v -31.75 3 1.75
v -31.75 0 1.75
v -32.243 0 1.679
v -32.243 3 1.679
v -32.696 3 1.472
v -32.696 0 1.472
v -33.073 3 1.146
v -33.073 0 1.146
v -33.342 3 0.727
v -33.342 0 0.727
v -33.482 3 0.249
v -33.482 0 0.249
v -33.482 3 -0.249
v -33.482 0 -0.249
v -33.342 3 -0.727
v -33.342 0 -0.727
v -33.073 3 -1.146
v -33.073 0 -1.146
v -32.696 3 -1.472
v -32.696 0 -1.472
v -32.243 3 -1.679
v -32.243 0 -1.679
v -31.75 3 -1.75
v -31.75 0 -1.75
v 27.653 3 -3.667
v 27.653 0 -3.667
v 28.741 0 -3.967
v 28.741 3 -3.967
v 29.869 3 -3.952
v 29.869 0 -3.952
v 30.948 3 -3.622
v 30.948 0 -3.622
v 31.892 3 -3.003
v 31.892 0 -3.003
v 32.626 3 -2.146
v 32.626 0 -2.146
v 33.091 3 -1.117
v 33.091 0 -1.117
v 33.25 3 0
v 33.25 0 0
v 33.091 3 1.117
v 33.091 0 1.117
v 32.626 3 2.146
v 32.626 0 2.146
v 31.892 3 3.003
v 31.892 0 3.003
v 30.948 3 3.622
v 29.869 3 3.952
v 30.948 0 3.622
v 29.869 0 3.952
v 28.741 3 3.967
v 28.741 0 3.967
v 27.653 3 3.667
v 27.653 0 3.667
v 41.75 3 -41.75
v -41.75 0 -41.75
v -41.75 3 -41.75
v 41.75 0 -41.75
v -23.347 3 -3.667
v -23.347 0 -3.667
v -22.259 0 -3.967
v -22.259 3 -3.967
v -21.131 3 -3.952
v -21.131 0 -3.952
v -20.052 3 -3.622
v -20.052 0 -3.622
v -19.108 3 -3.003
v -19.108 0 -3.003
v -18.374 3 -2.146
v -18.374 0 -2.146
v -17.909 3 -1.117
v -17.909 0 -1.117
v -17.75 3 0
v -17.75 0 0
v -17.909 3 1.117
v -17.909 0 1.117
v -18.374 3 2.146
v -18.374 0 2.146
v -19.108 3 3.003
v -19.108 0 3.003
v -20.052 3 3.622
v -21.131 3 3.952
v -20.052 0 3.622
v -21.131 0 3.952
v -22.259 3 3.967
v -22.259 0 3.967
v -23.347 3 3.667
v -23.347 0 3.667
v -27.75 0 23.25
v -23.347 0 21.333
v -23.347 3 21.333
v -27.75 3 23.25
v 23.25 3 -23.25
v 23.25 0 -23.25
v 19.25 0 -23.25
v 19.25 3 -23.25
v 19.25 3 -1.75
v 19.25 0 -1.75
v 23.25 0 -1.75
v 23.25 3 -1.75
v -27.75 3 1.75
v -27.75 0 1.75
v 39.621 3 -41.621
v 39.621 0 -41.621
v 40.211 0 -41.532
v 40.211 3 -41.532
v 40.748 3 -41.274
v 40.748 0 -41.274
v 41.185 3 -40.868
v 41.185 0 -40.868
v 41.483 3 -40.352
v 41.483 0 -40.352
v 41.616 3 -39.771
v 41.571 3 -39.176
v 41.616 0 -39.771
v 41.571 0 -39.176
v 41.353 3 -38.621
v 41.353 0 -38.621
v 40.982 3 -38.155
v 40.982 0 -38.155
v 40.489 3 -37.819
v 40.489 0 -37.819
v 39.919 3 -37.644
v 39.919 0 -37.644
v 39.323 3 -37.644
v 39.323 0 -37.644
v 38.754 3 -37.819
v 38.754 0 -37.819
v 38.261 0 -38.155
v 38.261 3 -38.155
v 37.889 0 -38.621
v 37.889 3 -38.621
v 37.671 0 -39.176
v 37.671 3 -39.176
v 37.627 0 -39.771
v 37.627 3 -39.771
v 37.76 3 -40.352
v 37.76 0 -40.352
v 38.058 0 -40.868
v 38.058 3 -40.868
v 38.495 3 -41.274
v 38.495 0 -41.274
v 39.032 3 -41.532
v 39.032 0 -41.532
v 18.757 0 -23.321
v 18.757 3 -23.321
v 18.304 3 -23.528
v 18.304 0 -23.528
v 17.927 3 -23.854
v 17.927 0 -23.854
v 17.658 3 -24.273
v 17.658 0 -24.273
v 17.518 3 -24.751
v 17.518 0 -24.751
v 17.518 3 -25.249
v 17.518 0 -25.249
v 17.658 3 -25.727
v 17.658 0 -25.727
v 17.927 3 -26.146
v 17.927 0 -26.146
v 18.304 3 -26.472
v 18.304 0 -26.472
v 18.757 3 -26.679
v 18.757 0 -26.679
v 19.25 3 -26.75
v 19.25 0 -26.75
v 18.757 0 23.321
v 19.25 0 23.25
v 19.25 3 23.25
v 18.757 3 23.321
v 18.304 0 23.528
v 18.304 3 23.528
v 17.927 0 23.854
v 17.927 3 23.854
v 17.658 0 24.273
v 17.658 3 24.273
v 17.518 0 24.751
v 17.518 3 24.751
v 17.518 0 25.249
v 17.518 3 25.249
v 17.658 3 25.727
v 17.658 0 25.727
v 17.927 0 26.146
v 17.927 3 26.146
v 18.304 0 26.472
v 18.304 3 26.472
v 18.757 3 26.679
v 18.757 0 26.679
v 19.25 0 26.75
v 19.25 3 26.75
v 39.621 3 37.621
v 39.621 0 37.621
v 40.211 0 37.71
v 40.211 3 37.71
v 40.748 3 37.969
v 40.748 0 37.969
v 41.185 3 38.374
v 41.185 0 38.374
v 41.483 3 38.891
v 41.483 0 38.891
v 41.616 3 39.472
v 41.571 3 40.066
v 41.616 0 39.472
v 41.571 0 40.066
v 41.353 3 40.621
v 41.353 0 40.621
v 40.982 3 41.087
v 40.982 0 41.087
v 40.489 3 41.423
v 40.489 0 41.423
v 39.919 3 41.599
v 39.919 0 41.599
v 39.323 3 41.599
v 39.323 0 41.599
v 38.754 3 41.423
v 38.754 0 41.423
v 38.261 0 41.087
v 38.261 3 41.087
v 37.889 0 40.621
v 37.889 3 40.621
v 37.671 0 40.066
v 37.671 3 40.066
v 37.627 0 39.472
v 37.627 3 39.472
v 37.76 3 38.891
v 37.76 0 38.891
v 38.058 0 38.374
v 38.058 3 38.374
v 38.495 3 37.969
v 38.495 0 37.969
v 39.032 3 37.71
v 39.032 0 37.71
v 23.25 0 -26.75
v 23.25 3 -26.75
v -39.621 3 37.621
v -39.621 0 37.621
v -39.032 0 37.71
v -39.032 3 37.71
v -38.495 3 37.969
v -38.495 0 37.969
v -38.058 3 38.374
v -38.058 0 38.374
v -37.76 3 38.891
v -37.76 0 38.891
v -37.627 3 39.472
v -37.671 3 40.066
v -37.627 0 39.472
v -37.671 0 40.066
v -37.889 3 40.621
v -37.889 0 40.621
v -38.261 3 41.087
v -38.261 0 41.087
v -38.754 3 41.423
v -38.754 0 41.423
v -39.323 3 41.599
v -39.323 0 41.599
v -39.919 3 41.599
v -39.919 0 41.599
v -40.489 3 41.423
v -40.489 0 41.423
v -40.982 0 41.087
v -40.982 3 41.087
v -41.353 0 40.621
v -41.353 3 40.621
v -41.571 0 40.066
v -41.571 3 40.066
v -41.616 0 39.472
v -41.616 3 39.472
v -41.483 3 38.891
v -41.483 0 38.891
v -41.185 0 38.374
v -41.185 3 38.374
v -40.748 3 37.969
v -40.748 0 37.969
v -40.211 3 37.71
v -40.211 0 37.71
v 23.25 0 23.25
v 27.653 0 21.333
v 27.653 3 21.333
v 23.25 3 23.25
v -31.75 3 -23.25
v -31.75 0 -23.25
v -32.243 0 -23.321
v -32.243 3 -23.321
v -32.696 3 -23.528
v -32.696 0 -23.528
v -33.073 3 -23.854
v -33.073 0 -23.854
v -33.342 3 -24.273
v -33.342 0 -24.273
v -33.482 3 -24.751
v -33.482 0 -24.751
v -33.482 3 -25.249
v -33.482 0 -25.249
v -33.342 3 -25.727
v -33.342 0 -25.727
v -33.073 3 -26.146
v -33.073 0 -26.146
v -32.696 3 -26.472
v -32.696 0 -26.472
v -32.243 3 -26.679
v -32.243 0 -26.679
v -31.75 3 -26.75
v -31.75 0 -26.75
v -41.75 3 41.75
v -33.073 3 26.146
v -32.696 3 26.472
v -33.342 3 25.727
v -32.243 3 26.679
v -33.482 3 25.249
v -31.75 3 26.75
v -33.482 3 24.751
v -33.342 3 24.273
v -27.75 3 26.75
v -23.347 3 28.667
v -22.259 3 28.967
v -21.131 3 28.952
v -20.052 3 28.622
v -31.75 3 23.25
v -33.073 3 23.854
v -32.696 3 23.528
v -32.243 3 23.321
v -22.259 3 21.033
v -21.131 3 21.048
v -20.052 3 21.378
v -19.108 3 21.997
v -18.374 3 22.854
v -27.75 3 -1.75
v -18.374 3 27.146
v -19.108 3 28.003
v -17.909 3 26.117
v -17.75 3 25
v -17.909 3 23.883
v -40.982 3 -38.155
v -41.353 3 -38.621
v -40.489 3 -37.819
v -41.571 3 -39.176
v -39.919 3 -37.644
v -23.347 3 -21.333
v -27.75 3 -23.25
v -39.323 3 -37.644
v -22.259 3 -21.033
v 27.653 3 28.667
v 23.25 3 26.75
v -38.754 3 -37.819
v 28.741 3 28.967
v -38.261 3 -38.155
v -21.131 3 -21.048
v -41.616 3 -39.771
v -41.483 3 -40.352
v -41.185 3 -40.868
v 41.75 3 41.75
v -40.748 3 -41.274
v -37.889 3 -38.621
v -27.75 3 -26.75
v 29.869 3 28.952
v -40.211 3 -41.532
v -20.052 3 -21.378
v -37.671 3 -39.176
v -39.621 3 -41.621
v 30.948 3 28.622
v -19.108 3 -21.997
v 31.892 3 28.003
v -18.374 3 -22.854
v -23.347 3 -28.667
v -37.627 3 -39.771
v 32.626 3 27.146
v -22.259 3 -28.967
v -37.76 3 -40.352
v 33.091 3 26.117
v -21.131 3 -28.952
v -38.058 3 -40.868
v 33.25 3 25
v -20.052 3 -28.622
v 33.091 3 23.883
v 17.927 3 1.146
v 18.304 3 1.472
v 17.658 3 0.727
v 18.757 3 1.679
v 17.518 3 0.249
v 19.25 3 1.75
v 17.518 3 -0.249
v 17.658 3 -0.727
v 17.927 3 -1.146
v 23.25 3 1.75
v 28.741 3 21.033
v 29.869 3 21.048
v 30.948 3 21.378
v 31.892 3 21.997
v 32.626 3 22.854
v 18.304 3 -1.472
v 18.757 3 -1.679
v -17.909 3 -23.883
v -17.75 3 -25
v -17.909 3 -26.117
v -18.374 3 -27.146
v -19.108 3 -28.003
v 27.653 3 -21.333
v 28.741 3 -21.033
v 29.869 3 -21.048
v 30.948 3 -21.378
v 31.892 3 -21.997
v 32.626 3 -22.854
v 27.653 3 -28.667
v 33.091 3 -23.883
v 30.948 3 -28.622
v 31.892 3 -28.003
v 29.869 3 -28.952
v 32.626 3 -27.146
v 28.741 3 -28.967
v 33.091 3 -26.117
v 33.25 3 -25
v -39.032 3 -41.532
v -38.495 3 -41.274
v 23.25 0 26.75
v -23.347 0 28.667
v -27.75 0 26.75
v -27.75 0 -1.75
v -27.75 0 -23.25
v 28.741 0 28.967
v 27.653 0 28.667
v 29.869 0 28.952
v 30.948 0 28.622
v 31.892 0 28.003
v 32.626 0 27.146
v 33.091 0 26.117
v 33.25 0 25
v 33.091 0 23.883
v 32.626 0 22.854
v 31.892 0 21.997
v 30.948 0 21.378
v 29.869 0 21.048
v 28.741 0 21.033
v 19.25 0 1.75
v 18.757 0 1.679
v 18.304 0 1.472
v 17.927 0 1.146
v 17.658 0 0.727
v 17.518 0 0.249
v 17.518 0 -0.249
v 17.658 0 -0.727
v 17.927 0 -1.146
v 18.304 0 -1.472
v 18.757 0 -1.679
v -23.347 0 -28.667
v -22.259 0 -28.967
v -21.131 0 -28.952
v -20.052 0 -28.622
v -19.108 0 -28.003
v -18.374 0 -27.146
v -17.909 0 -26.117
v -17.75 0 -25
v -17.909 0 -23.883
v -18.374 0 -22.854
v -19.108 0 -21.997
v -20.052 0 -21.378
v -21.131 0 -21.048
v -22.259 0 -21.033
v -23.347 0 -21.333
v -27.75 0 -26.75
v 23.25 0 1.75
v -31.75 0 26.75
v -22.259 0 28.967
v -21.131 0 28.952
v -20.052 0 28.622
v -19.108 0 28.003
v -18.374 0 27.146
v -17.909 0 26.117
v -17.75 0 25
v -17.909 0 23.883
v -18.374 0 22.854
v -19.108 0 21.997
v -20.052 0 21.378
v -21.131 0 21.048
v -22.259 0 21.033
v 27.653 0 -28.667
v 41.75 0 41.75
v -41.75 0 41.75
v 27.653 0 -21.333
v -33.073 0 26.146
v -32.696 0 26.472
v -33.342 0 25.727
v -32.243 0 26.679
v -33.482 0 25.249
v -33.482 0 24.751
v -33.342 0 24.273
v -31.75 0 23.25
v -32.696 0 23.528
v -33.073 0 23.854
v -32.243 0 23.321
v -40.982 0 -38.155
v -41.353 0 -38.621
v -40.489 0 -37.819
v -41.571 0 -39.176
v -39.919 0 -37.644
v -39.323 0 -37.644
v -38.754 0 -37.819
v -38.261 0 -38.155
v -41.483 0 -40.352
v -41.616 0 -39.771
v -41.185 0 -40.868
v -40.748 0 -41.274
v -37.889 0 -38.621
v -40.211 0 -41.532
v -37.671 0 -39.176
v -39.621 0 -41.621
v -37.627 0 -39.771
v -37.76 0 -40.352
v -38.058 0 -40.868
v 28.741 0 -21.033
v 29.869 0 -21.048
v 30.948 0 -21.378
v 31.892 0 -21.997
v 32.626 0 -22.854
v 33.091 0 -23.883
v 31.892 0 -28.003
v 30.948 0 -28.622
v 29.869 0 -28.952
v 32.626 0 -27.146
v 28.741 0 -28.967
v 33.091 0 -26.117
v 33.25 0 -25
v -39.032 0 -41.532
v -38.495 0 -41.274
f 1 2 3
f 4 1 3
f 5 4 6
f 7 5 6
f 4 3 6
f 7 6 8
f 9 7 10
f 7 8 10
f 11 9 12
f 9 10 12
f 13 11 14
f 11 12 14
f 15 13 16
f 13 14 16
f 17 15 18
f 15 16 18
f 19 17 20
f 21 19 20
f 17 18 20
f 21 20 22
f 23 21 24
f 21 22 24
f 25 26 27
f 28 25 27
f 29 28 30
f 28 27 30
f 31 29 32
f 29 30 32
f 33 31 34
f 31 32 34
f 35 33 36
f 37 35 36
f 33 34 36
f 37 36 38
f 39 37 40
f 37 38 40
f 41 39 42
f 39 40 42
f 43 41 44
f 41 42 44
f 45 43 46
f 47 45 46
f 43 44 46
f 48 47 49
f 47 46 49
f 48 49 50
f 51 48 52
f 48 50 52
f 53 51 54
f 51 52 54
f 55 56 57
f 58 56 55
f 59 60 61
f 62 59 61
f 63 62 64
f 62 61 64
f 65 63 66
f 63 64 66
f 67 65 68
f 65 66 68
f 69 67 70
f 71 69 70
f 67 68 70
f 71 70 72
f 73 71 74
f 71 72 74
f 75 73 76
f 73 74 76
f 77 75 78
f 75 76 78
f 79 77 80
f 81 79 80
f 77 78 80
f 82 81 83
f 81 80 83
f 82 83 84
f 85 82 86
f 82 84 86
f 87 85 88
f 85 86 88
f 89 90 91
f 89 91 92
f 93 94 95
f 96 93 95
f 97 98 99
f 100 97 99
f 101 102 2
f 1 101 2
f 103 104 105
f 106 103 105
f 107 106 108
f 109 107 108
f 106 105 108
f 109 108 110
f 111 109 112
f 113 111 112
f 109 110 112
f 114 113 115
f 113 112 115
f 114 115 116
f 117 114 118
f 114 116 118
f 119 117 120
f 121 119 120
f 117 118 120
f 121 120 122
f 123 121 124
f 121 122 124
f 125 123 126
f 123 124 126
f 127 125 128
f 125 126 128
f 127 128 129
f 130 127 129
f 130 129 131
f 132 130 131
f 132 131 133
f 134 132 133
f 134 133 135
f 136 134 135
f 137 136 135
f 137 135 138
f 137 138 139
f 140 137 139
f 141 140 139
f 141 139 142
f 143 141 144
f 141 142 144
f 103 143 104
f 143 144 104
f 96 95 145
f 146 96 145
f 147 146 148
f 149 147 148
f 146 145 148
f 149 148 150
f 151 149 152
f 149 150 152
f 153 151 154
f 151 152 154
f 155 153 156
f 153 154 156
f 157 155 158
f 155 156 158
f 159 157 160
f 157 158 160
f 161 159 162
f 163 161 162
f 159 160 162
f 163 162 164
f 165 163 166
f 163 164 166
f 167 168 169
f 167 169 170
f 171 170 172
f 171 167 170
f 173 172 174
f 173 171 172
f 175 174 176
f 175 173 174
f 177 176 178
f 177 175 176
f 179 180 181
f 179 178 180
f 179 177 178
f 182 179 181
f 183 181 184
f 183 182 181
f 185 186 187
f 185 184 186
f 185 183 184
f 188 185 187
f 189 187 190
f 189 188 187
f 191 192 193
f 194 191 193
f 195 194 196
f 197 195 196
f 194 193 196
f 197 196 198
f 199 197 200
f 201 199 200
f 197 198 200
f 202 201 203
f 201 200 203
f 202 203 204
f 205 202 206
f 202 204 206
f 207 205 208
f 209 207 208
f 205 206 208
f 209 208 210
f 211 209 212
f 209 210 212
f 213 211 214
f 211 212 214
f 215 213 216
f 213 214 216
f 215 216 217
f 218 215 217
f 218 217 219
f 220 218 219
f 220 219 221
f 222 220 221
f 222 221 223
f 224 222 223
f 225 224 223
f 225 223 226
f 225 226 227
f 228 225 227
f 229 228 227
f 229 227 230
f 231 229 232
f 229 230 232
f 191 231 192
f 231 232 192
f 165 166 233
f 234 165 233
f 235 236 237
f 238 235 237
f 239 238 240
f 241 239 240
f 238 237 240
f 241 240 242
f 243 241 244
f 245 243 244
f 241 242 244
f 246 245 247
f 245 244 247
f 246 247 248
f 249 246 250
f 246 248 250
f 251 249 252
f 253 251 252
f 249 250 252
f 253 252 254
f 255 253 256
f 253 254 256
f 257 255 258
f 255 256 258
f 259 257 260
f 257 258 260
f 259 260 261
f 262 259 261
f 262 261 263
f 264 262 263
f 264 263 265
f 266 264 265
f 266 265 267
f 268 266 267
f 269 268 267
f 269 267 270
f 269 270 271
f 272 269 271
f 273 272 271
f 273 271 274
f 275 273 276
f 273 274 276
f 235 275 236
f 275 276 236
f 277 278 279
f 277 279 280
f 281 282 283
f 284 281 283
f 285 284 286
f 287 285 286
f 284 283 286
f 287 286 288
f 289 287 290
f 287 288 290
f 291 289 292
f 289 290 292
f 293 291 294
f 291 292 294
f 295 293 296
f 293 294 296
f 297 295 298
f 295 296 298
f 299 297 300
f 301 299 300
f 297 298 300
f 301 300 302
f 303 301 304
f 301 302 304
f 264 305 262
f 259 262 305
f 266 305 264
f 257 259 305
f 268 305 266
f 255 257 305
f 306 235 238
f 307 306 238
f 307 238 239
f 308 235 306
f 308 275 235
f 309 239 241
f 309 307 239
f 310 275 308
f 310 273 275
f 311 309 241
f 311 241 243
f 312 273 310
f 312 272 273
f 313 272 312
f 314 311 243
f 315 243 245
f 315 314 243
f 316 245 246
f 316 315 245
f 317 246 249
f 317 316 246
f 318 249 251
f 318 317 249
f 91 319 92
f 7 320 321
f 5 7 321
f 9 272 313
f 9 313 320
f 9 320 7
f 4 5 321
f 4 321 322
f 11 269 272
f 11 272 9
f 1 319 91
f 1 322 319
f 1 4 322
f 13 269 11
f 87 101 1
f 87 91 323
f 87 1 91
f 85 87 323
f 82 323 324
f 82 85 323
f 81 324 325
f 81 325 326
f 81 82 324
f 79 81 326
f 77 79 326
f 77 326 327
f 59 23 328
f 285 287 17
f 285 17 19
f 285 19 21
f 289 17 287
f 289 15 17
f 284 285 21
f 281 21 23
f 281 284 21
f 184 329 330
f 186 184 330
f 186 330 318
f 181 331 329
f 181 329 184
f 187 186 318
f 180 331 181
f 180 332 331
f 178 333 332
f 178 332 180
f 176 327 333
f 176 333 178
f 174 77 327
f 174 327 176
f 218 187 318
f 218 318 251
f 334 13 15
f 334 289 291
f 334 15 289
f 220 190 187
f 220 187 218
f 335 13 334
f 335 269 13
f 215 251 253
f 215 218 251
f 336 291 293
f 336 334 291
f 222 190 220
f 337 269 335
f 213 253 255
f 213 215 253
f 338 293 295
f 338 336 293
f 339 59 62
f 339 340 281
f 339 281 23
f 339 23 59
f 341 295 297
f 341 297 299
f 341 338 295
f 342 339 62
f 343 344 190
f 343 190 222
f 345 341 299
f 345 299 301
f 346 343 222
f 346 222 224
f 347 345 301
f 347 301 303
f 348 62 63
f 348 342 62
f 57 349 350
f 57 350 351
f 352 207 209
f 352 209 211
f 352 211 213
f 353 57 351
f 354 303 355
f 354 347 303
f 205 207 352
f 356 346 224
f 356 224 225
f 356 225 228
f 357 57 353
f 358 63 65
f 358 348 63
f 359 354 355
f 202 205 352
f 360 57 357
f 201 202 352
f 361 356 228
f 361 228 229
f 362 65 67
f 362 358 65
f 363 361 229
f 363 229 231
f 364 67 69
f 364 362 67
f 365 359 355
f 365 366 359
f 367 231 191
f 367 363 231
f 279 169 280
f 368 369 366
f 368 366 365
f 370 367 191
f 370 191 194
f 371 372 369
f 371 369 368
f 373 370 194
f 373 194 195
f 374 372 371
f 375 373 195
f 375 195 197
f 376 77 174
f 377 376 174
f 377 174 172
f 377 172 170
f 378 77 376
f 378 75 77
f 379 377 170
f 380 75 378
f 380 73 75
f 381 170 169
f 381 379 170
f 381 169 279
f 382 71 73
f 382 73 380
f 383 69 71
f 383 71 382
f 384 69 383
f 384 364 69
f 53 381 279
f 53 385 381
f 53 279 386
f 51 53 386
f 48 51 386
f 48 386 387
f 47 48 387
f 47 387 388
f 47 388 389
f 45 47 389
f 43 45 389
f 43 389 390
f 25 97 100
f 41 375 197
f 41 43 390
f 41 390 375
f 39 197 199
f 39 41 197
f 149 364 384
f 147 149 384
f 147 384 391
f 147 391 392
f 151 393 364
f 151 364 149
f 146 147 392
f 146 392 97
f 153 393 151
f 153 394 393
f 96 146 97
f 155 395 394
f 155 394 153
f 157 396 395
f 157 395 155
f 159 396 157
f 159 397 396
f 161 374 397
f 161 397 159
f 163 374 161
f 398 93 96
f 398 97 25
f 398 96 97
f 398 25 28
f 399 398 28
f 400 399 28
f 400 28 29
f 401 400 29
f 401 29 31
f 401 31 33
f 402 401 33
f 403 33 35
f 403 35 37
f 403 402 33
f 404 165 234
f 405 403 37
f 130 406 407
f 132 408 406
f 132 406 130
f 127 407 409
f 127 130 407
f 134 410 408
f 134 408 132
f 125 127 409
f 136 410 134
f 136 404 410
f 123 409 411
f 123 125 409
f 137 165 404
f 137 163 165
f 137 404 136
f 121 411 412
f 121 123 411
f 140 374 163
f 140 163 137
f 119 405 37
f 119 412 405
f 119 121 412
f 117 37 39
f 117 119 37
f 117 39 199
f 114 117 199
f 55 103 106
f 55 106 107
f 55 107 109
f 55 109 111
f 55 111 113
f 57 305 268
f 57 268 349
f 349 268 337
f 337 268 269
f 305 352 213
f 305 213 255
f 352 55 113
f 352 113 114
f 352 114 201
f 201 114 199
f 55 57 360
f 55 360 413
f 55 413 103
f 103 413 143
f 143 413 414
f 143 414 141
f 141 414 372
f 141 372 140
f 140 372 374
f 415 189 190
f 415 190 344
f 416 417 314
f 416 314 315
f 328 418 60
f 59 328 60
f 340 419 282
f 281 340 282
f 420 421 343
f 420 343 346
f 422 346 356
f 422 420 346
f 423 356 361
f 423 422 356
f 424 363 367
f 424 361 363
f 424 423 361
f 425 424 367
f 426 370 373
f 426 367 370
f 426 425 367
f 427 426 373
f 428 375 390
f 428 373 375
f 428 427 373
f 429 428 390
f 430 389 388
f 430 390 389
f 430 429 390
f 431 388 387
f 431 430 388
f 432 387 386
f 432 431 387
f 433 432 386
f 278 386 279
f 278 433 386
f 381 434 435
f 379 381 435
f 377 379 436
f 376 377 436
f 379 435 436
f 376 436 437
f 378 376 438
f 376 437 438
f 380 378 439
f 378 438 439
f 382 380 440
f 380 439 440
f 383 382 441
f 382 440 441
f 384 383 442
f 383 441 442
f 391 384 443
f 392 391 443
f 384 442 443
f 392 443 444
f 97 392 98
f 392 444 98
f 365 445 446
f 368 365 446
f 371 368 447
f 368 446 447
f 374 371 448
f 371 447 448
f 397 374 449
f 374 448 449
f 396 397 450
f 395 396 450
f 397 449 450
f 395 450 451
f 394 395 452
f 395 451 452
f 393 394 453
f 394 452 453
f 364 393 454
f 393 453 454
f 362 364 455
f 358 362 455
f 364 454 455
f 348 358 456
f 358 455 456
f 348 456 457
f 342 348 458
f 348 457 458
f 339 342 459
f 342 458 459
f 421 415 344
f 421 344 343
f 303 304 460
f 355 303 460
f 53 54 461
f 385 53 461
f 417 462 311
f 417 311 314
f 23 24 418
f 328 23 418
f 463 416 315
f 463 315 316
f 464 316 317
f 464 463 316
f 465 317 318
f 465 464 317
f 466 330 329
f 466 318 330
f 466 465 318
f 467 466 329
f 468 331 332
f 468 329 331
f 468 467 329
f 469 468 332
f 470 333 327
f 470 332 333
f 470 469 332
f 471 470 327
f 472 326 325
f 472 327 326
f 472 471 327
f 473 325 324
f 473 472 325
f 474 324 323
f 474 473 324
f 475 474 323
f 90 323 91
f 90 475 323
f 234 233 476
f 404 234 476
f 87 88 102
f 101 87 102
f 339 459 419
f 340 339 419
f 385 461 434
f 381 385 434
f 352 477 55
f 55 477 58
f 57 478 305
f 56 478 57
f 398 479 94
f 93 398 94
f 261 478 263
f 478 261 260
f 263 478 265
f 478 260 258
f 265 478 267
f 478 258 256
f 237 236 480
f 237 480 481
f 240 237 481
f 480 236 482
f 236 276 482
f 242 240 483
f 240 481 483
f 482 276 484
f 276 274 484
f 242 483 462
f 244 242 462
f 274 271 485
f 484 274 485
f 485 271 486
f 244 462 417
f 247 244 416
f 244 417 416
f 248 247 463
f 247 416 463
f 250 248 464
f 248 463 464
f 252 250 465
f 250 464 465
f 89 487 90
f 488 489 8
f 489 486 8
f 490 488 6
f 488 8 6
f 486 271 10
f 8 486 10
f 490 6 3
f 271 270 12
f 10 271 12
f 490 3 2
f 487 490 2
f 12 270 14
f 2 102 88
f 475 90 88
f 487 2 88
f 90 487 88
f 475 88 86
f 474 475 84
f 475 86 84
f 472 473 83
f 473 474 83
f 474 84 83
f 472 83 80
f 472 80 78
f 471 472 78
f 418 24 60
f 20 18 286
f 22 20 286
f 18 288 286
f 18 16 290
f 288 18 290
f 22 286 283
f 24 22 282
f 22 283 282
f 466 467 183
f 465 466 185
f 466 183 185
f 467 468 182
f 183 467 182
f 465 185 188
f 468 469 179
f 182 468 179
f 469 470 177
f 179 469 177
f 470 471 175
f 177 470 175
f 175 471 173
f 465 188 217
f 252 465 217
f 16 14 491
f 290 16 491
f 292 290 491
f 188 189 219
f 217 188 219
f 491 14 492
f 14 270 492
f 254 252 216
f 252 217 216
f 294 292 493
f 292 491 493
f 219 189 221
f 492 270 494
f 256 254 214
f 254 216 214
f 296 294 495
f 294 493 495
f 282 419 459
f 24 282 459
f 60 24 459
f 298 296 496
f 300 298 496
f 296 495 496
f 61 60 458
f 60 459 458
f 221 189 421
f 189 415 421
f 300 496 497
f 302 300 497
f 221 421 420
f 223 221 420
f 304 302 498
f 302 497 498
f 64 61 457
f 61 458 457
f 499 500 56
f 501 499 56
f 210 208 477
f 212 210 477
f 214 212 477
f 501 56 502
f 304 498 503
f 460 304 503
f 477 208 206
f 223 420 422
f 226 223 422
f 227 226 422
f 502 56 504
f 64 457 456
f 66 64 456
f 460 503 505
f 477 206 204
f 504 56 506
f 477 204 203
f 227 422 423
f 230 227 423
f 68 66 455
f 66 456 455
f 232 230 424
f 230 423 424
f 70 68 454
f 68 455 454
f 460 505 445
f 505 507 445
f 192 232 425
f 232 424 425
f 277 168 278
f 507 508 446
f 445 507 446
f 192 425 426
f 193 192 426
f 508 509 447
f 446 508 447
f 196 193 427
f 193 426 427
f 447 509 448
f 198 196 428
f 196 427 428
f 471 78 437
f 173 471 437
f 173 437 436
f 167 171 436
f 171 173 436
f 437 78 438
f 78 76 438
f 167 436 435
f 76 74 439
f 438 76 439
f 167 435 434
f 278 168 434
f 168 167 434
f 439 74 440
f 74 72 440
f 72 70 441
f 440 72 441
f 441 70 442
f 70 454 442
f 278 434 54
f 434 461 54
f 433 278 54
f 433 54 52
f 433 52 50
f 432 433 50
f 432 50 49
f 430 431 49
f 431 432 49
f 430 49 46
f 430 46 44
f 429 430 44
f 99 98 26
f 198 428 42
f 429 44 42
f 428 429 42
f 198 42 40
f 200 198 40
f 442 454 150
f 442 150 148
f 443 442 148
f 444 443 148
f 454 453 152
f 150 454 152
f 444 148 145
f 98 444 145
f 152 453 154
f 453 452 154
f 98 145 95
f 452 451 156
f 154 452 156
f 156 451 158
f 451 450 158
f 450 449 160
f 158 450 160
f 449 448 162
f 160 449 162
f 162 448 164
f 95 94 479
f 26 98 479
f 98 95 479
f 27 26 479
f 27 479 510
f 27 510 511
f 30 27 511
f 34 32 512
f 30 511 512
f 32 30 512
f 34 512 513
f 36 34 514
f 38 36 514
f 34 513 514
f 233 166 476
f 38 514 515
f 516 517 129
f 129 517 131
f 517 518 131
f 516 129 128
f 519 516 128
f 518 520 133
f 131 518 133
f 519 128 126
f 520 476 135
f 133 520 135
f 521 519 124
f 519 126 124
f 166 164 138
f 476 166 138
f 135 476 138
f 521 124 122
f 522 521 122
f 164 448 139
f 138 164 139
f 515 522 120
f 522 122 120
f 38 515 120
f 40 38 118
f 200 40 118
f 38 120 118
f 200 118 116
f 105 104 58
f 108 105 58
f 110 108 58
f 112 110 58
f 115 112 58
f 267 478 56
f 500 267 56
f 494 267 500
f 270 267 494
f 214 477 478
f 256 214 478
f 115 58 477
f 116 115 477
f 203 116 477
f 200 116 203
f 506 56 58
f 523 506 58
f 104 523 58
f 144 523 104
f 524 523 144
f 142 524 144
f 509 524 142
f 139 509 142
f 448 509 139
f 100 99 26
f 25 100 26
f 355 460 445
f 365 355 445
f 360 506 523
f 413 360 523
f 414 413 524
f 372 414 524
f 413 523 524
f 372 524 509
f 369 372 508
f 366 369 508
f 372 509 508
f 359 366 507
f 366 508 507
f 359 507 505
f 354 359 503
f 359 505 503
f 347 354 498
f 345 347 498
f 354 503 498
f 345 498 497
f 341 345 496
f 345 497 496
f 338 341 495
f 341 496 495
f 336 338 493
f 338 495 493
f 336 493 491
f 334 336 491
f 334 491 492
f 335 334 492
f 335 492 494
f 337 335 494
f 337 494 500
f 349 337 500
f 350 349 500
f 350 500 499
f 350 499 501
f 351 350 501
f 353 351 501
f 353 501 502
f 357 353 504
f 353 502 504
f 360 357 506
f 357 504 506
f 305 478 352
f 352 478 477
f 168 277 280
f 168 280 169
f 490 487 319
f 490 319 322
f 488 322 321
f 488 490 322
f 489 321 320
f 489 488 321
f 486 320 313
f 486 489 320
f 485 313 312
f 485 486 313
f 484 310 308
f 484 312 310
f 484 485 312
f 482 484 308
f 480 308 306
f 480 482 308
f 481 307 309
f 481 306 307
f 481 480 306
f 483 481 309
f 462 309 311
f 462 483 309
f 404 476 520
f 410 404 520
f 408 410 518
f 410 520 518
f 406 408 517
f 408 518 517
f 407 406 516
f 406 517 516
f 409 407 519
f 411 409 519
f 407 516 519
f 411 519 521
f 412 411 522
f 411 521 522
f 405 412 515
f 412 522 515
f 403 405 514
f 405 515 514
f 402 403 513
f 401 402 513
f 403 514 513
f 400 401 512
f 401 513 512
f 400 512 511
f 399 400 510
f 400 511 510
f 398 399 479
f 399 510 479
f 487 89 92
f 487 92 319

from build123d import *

# Parameters (mm, degrees)
SCHIZZO1_W                   = 83.5
SCHIZZO1_H                   = 83.5
ESTRUSIONE_ESTRUSIONE1_DEPTH = 3
SCHIZZO2_R                   = 2
TAGLIO_ESTRUSIONE1_DEPTH     = 3
TAGLIO_ESTRUSIONE2_DEPTH     = 60.119582204
RIPETIZIONE_A_L1_COUNT       = 2
RIPETIZIONE_A_L1_PITCH       = 51
RIPETIZIONE_A_L1_COUNT_DIR2  = 2
RIPETIZIONE_A_L1_PITCH_DIR2  = 25
SPECCHIA1_COPY_1_DEPTH       = 60.119582204
SPECCHIA1_COPY_2_DEPTH       = 60.119582204
SPECCHIA1_COPY_3_DEPTH       = 60.119582204
SPECCHIA1_COPY_4_DEPTH       = 60.119582204


with BuildPart() as part:
    # Schizzo1 → Estrusione-Estrusione1 (new body)
    with BuildSketch(Plane(origin=(0, 0, 0), x_dir=(1, 0, 0), z_dir=(0, 1, 0))):
        Rectangle(SCHIZZO1_W, SCHIZZO1_H)
    extrude(amount=ESTRUSIONE_ESTRUSIONE1_DEPTH)

    # Schizzo2 → Taglio-Estrusione1 (cut)
    with BuildSketch(Plane(origin=(0, 0, 0), x_dir=(-1, 0, 0), z_dir=(0, -1, 0))):
        with Locations(Location((39.621320344, 39.621320344, 0), (0, 0, 90))):
            Circle(SCHIZZO2_R)
        with Locations(Location((39.621320344, -39.621320344, 0), (0, 0, 90))):
            Circle(SCHIZZO2_R)
        with Locations(Location((-39.621320344, 39.621320344, 0), (0, 0, 90))):
            Circle(SCHIZZO2_R)
        with Locations(Location((-39.621320344, -39.621320344, 0), (0, 0, 90))):
            Circle(SCHIZZO2_R)
    extrude(amount=-TAGLIO_ESTRUSIONE1_DEPTH, mode=Mode.SUBTRACT)

    # Schizzo4 → Taglio-Estrusione2 (cut, through all)
    with BuildSketch(Plane.XZ):
        with BuildLine():
            Line((-27.75, 1.75), (-31.75, 1.75))
            ThreePointArc((-31.75, 1.75), (-33.5, 0), (-31.75, -1.75))
            Line((-31.75, -1.75), (-27.75, -1.75))
            Line((-27.75, -1.75), (-23.347020102, -3.667359649))
            ThreePointArc((-23.347020102, -3.667359649), (-17.75, 0), (-23.347020102, 3.667359649))
            Line((-23.347020102, 3.667359649), (-27.75, 1.75))
        make_face()
    taglio_estrusione2 = extrude(amount=-TAGLIO_ESTRUSIONE2_DEPTH, mode=Mode.SUBTRACT)

    # Ripetizione a L1: Taglio-Estrusione2 2 × 2
    with Locations(*[(i * RIPETIZIONE_A_L1_PITCH, 0, -j * RIPETIZIONE_A_L1_PITCH_DIR2) for i in range(RIPETIZIONE_A_L1_COUNT) for j in range(RIPETIZIONE_A_L1_COUNT_DIR2) if (i, j) != (0, 0)]):
        add(taglio_estrusione2, mode=Mode.SUBTRACT)

    # Specchia1 copy 1 sketch → Specchia1 copy 1 (cut, through all)
    with BuildSketch(Plane(origin=(0, 0, 25), x_dir=(1, 0, 0), z_dir=(0, -1, 0))):
        with BuildLine():
            Line((-27.75, -1.75), (-31.75, -1.75))
            ThreePointArc((-31.75, -1.75), (-33.5, 0), (-31.75, 1.75))
            Line((-31.75, 1.75), (-27.75, 1.75))
            Line((-27.75, 1.75), (-23.347020102, 3.667359649))
            ThreePointArc((-23.347020102, 3.667359649), (-17.75, 0), (-23.347020102, -3.667359649))
            Line((-23.347020102, -3.667359649), (-27.75, -1.75))
        make_face()
    extrude(amount=-SPECCHIA1_COPY_1_DEPTH, mode=Mode.SUBTRACT)

    # Specchia1 copy 2 sketch → Specchia1 copy 2 (cut, through all)
    with BuildSketch(Plane(origin=(51, 0, 0), x_dir=(1, 0, 0), z_dir=(0, -1, 0))):
        with BuildLine():
            Line((-27.75, -1.75), (-31.75, -1.75))
            ThreePointArc((-31.75, -1.75), (-33.5, 0), (-31.75, 1.75))
            Line((-31.75, 1.75), (-27.75, 1.75))
            Line((-27.75, 1.75), (-23.347020102, 3.667359649))
            ThreePointArc((-23.347020102, 3.667359649), (-17.75, 0), (-23.347020102, -3.667359649))
            Line((-23.347020102, -3.667359649), (-27.75, -1.75))
        make_face()
    extrude(amount=-SPECCHIA1_COPY_2_DEPTH, mode=Mode.SUBTRACT)

    # Specchia1 copy 3 sketch → Specchia1 copy 3 (cut, through all)
    with BuildSketch(Plane(origin=(51, 0, 25), x_dir=(1, 0, 0), z_dir=(0, -1, 0))):
        with BuildLine():
            Line((-27.75, -1.75), (-31.75, -1.75))
            ThreePointArc((-31.75, -1.75), (-33.5, 0), (-31.75, 1.75))
            Line((-31.75, 1.75), (-27.75, 1.75))
            Line((-27.75, 1.75), (-23.347020102, 3.667359649))
            ThreePointArc((-23.347020102, 3.667359649), (-17.75, 0), (-23.347020102, -3.667359649))
            Line((-23.347020102, -3.667359649), (-27.75, -1.75))
        make_face()
    extrude(amount=-SPECCHIA1_COPY_3_DEPTH, mode=Mode.SUBTRACT)

    # Specchia1 copy 4 sketch → Specchia1 copy 4 (cut, through all)
    with BuildSketch(Plane.XZ):
        with BuildLine():
            Line((-27.75, -1.75), (-31.75, -1.75))
            ThreePointArc((-31.75, -1.75), (-33.5, 0), (-31.75, 1.75))
            Line((-31.75, 1.75), (-27.75, 1.75))
            Line((-27.75, 1.75), (-23.347020102, 3.667359649))
            ThreePointArc((-23.347020102, 3.667359649), (-17.75, 0), (-23.347020102, -3.667359649))
            Line((-23.347020102, -3.667359649), (-27.75, -1.75))
        make_face()
    extrude(amount=-SPECCHIA1_COPY_4_DEPTH, mode=Mode.SUBTRACT)


solid = part.part
